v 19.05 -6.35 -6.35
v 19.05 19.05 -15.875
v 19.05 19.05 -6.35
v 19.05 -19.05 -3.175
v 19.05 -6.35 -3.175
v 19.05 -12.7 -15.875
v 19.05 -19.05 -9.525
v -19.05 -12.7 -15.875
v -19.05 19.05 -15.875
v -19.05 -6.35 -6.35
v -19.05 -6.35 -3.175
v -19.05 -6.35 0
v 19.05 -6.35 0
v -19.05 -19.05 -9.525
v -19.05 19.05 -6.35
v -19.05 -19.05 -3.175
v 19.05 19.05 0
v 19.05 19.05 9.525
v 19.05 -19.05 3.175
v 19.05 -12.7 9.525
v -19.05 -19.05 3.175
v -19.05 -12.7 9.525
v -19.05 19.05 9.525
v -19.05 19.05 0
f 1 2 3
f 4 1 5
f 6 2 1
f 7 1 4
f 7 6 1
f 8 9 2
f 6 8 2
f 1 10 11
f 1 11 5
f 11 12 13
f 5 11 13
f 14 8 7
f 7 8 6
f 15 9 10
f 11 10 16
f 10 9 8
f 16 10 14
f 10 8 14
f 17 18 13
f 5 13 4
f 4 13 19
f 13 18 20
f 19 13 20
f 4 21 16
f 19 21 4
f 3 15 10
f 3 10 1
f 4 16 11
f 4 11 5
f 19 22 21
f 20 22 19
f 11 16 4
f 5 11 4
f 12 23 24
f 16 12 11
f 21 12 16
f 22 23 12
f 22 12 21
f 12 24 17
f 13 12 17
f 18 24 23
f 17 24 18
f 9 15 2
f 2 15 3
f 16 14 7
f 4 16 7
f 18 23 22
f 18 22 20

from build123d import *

# Parameters (mm, degrees)
F0_W     = 38.1
F0_H     = 38.1
F1_DEPTH = 9.525
F2_SIZE  = 6.35
F3_W     = 38.1
F3_H     = 12.7
F4_DEPTH = 3.175


with BuildPart() as f1:
    # F0 (on Top) → F1 (new body)
    with BuildSketch(Plane.XY):
        Rectangle(F0_W, F0_H)
    extrude(amount=F1_DEPTH)

    # F2
    f2_edges = [f1.edges().sort_by_distance(p)[0] for p in [
        (0, -19.05, 9.525),
    ]]
    chamfer(f2_edges, length=F2_SIZE)

    # F3 (on face) → F4 (join)
    with BuildSketch(Plane(origin=(0, 0, 0), x_dir=(1, 0, 0), z_dir=(0, 0, -1))):
        with Locations((0, 12.7)):
            Rectangle(F3_W, F3_H)
    extrude(amount=F4_DEPTH)


with BuildPart() as f5_1:
    # F5: instance of F1
    add(f1.part.mirror(Plane(origin=(0, -12.7, -3.175), x_dir=(1, 0, 0), z_dir=(0, 0, -1))))


solid = Compound([f1.part, f5_1.part])
